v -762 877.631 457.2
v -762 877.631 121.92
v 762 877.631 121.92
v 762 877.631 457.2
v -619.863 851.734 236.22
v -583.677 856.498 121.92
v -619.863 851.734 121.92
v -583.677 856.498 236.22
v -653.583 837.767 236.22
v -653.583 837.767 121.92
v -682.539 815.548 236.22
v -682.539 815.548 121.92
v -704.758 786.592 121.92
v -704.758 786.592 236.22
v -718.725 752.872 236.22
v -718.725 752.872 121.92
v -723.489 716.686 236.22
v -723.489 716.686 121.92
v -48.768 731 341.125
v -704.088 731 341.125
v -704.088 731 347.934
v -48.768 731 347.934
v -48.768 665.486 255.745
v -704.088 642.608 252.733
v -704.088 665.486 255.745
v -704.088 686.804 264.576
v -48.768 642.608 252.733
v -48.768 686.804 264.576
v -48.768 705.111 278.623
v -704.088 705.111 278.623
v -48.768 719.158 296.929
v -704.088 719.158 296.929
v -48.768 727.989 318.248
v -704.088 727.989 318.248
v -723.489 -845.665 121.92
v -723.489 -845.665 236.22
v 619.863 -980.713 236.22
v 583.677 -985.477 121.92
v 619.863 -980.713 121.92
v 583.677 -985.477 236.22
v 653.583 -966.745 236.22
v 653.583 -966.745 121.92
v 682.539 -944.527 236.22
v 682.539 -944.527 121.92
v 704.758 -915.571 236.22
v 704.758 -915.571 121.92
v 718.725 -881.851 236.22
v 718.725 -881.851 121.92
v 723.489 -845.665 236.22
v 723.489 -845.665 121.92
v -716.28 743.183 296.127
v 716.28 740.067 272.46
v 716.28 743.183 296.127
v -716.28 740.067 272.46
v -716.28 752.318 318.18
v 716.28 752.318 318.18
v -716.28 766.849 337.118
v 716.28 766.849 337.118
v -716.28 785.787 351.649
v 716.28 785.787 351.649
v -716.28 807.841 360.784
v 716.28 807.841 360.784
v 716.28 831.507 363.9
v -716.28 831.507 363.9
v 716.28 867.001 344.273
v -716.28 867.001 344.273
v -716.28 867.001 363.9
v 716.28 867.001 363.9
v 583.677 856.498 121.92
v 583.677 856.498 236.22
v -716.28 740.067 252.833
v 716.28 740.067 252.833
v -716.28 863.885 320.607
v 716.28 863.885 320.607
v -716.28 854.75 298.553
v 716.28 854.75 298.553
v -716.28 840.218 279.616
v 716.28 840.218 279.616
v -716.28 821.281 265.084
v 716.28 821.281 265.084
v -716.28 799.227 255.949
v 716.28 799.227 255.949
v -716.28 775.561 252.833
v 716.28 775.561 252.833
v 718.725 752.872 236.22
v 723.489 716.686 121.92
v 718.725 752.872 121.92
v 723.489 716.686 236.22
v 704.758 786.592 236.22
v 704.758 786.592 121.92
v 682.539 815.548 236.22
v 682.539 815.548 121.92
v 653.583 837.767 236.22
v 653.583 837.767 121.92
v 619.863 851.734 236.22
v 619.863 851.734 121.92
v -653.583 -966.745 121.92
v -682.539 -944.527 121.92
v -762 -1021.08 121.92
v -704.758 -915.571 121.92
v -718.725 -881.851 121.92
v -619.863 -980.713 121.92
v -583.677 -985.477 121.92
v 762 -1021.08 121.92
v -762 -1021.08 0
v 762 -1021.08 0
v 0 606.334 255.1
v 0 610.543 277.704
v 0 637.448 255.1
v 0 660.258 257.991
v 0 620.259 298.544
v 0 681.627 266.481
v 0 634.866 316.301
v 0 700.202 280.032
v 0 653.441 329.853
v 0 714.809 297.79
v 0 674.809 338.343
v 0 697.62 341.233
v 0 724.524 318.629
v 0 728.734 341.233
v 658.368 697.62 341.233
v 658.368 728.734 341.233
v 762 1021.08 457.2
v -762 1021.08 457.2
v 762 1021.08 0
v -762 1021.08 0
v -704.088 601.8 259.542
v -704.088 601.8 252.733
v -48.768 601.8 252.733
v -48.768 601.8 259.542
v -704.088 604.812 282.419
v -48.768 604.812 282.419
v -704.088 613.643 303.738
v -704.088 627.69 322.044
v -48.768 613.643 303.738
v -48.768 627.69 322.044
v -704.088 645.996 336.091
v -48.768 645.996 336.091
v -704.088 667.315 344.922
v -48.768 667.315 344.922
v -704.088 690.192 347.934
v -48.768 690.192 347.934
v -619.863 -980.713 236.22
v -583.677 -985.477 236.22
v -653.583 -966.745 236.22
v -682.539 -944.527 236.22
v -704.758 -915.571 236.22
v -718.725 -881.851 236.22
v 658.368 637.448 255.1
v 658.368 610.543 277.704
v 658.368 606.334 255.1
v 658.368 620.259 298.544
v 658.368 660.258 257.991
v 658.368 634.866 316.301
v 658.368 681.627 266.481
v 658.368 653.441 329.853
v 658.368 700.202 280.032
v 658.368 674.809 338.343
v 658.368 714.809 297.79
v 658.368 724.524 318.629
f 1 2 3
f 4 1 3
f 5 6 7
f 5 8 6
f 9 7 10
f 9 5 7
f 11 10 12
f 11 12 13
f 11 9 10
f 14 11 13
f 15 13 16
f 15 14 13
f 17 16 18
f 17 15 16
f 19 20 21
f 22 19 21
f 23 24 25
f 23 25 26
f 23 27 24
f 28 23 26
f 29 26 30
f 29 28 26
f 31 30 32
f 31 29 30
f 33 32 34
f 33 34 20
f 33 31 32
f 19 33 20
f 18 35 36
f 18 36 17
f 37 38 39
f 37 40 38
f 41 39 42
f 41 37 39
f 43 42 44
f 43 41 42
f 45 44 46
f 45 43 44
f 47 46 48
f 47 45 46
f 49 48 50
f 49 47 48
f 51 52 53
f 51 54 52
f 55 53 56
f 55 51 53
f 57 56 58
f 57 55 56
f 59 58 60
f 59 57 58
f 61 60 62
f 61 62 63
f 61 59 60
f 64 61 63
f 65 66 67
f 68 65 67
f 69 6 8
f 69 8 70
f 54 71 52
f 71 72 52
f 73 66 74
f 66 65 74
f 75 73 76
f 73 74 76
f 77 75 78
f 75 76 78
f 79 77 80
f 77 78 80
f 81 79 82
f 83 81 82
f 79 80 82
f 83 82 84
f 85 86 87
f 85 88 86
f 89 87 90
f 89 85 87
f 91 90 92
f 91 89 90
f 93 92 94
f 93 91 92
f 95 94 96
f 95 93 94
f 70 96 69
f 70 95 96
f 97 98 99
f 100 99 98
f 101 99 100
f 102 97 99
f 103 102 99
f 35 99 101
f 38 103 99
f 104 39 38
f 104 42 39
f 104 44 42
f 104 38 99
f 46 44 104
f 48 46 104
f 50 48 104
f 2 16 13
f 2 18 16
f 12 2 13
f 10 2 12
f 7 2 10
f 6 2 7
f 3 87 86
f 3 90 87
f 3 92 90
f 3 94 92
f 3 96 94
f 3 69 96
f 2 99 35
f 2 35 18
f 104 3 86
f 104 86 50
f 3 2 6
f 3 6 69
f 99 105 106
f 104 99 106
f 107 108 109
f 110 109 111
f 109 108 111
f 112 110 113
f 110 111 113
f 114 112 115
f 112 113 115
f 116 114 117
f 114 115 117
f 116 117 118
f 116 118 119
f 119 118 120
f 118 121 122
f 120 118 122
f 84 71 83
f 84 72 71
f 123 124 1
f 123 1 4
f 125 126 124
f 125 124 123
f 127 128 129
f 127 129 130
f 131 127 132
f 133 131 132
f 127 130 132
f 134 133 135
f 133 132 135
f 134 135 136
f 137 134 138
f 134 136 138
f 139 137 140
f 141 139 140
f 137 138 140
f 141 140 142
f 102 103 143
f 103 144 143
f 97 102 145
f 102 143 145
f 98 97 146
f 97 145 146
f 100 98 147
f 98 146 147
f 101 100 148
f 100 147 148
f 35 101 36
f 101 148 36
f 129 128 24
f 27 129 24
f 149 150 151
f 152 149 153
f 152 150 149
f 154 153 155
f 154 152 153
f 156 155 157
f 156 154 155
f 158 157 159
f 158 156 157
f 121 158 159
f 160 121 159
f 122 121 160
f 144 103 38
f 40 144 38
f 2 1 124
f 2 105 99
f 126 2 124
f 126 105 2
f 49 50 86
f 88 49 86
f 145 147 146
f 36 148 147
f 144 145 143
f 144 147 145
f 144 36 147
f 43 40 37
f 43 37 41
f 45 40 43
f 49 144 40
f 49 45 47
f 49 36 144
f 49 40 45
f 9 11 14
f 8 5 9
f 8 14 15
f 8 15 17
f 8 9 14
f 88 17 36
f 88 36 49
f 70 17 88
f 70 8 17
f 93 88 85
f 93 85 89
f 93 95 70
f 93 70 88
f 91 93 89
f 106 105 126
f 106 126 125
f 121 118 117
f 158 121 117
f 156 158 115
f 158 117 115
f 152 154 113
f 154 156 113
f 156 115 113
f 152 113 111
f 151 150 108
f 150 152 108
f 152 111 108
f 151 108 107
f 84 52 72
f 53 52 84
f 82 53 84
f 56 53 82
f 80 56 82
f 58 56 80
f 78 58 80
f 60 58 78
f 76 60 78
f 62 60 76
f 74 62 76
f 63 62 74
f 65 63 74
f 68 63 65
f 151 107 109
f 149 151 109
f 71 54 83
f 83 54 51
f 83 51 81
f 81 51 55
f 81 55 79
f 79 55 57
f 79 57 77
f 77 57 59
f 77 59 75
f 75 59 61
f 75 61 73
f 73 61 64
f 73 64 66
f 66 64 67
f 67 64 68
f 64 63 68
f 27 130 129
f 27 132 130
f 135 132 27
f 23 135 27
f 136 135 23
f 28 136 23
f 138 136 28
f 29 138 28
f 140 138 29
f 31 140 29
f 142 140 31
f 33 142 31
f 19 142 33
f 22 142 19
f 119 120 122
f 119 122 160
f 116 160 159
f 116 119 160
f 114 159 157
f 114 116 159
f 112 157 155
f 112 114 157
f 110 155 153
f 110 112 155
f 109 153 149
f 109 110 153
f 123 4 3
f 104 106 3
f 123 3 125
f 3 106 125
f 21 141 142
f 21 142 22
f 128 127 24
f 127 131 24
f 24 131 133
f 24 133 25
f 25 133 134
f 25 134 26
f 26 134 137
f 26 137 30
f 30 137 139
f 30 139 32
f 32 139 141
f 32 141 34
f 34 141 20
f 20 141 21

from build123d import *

# Parameters (mm, degrees)
F0_W         = 1524
F0_H         = 2042.16
F1_DEPTH     = 121.92
F2_W         = 1446.9777941704
F2_H         = 1841.9745564461
F3_DEPTH     = 114.3
F4_R         = 139.8119358242
F5_W         = 1524
F5_H         = 143.4489317703
F6_DEPTH     = 335.28
F7_W         = 126.9334554672
F7_H         = 111.0667288303
F8_DEPTH     = 716.28
F9_R         = 91.44
F10_W        = 122.4000453949
F10_H        = 86.1333906651
F11_DEPTH    = 658.368
F12_T1_DEPTH = 1114.797444092
F14_W        = 129.2001008987
F14_H        = 95.2000617981
F15_DEPTH    = 655.32
F16_R        = 88.392


# Not quite as in the source:
# - a fillet or chamfer that OpenCascade refuses, or shapes differently, is made with other operations: its cross-section is extruded or revolved along the edge and cut away or added


with BuildPart() as f1:
    # F0 (on Top) → F1 (new body)
    with BuildSketch(Plane.XY):
        Rectangle(F0_W, F0_H)
    extrude(amount=F1_DEPTH)

    # F2 (on face) → F3 (join)
    with BuildSketch(Plane.XY.offset(121.92)):
        with Locations((-2.98023e-05, -64.4892752171)):
            Rectangle(F2_W, F2_H)
    extrude(amount=F3_DEPTH)

    # F4
    f4_edges = [f1.edges().sort_by_distance(p)[0] for p in [
        (-723.488927, 856.498003, 179.07),
        (723.488867, 856.498003, 179.07),
        (723.488867, -985.476553, 179.07),
        (-723.488927, -985.476553, 179.07),
    ]]
    fillet(f4_edges, radius=F4_R)

    # F5 (on face) → F6 (join)
    with BuildSketch(Plane.XY.offset(121.92)):
        with Locations((0, 949.3555341148)):
            Rectangle(F5_W, F5_H)
    extrude(amount=F6_DEPTH)


with BuildPart() as f8:
    # F7 (on Right) → F8 (new body, symmetric)
    with BuildSketch(Plane.YZ):
        with Locations((803.5338521004, 308.3667308092)):
            Rectangle(F7_W, F7_H)
    extrude(amount=F8_DEPTH, both=True)

    # F9
    f9_edges = [f8.edges().sort_by_distance(p)[0] for p in [
        (0, 740.067124, 363.900095),
        (0, 867.00058, 252.833366),
    ]]
    fillet(f9_edges, radius=F9_R)


with BuildPart() as f11:
    # F10 (on Right) → F11 (new body)
    with BuildSketch(Plane.YZ):
        with Locations((667.5337553024, 298.1667369604)):
            Rectangle(F10_W, F10_H)
    extrude(amount=F11_DEPTH)

    # F12: fillet of radius 91.44 on 2 edges, made by hand

    # F12_s2 → F12_t1 (cut)
    with BuildSketch(Plane.YZ.offset(-228.214722046)):
        with BuildLine():
            ThreePointArc((697.6196214234, 341.2334322929), (634.8659870967, 316.3009880952), (606.333732605, 255.1000416279))
            Line((606.333732605, 255.1000416279), (606.333732605, 341.2334322929))
            Line((606.333732605, 341.2334322929), (697.6196214234, 341.2334322929))
        make_face()
        with BuildLine():
            ThreePointArc((728.7337779999, 341.2334322929), (700.2015235081, 280.0324858256), (637.4478891815, 255.1000416279))
            Line((637.4478891815, 255.1000416279), (728.7337779999, 255.1000416279))
            Line((728.7337779999, 255.1000416279), (728.7337779999, 341.2334322929))
        make_face()
    extrude(amount=F12_T1_DEPTH, mode=Mode.SUBTRACT)


with BuildPart() as f15:
    # F14 (on offset) → F15 (new body)
    with BuildSketch(Plane.YZ.offset(-704.088)):
        with Locations((666.4004325867, 300.3335297108)):
            Rectangle(F14_W, F14_H)
    extrude(amount=F15_DEPTH)

    # F16
    f16_edges = [f15.edges().sort_by_distance(p)[0] for p in [
        (-376.428, 601.800382, 347.933561),
        (-376.428, 731.000483, 252.733499),
    ]]
    fillet(f16_edges, radius=F16_R)


solid = Compound([f1.part, f8.part, f11.part, f15.part])
